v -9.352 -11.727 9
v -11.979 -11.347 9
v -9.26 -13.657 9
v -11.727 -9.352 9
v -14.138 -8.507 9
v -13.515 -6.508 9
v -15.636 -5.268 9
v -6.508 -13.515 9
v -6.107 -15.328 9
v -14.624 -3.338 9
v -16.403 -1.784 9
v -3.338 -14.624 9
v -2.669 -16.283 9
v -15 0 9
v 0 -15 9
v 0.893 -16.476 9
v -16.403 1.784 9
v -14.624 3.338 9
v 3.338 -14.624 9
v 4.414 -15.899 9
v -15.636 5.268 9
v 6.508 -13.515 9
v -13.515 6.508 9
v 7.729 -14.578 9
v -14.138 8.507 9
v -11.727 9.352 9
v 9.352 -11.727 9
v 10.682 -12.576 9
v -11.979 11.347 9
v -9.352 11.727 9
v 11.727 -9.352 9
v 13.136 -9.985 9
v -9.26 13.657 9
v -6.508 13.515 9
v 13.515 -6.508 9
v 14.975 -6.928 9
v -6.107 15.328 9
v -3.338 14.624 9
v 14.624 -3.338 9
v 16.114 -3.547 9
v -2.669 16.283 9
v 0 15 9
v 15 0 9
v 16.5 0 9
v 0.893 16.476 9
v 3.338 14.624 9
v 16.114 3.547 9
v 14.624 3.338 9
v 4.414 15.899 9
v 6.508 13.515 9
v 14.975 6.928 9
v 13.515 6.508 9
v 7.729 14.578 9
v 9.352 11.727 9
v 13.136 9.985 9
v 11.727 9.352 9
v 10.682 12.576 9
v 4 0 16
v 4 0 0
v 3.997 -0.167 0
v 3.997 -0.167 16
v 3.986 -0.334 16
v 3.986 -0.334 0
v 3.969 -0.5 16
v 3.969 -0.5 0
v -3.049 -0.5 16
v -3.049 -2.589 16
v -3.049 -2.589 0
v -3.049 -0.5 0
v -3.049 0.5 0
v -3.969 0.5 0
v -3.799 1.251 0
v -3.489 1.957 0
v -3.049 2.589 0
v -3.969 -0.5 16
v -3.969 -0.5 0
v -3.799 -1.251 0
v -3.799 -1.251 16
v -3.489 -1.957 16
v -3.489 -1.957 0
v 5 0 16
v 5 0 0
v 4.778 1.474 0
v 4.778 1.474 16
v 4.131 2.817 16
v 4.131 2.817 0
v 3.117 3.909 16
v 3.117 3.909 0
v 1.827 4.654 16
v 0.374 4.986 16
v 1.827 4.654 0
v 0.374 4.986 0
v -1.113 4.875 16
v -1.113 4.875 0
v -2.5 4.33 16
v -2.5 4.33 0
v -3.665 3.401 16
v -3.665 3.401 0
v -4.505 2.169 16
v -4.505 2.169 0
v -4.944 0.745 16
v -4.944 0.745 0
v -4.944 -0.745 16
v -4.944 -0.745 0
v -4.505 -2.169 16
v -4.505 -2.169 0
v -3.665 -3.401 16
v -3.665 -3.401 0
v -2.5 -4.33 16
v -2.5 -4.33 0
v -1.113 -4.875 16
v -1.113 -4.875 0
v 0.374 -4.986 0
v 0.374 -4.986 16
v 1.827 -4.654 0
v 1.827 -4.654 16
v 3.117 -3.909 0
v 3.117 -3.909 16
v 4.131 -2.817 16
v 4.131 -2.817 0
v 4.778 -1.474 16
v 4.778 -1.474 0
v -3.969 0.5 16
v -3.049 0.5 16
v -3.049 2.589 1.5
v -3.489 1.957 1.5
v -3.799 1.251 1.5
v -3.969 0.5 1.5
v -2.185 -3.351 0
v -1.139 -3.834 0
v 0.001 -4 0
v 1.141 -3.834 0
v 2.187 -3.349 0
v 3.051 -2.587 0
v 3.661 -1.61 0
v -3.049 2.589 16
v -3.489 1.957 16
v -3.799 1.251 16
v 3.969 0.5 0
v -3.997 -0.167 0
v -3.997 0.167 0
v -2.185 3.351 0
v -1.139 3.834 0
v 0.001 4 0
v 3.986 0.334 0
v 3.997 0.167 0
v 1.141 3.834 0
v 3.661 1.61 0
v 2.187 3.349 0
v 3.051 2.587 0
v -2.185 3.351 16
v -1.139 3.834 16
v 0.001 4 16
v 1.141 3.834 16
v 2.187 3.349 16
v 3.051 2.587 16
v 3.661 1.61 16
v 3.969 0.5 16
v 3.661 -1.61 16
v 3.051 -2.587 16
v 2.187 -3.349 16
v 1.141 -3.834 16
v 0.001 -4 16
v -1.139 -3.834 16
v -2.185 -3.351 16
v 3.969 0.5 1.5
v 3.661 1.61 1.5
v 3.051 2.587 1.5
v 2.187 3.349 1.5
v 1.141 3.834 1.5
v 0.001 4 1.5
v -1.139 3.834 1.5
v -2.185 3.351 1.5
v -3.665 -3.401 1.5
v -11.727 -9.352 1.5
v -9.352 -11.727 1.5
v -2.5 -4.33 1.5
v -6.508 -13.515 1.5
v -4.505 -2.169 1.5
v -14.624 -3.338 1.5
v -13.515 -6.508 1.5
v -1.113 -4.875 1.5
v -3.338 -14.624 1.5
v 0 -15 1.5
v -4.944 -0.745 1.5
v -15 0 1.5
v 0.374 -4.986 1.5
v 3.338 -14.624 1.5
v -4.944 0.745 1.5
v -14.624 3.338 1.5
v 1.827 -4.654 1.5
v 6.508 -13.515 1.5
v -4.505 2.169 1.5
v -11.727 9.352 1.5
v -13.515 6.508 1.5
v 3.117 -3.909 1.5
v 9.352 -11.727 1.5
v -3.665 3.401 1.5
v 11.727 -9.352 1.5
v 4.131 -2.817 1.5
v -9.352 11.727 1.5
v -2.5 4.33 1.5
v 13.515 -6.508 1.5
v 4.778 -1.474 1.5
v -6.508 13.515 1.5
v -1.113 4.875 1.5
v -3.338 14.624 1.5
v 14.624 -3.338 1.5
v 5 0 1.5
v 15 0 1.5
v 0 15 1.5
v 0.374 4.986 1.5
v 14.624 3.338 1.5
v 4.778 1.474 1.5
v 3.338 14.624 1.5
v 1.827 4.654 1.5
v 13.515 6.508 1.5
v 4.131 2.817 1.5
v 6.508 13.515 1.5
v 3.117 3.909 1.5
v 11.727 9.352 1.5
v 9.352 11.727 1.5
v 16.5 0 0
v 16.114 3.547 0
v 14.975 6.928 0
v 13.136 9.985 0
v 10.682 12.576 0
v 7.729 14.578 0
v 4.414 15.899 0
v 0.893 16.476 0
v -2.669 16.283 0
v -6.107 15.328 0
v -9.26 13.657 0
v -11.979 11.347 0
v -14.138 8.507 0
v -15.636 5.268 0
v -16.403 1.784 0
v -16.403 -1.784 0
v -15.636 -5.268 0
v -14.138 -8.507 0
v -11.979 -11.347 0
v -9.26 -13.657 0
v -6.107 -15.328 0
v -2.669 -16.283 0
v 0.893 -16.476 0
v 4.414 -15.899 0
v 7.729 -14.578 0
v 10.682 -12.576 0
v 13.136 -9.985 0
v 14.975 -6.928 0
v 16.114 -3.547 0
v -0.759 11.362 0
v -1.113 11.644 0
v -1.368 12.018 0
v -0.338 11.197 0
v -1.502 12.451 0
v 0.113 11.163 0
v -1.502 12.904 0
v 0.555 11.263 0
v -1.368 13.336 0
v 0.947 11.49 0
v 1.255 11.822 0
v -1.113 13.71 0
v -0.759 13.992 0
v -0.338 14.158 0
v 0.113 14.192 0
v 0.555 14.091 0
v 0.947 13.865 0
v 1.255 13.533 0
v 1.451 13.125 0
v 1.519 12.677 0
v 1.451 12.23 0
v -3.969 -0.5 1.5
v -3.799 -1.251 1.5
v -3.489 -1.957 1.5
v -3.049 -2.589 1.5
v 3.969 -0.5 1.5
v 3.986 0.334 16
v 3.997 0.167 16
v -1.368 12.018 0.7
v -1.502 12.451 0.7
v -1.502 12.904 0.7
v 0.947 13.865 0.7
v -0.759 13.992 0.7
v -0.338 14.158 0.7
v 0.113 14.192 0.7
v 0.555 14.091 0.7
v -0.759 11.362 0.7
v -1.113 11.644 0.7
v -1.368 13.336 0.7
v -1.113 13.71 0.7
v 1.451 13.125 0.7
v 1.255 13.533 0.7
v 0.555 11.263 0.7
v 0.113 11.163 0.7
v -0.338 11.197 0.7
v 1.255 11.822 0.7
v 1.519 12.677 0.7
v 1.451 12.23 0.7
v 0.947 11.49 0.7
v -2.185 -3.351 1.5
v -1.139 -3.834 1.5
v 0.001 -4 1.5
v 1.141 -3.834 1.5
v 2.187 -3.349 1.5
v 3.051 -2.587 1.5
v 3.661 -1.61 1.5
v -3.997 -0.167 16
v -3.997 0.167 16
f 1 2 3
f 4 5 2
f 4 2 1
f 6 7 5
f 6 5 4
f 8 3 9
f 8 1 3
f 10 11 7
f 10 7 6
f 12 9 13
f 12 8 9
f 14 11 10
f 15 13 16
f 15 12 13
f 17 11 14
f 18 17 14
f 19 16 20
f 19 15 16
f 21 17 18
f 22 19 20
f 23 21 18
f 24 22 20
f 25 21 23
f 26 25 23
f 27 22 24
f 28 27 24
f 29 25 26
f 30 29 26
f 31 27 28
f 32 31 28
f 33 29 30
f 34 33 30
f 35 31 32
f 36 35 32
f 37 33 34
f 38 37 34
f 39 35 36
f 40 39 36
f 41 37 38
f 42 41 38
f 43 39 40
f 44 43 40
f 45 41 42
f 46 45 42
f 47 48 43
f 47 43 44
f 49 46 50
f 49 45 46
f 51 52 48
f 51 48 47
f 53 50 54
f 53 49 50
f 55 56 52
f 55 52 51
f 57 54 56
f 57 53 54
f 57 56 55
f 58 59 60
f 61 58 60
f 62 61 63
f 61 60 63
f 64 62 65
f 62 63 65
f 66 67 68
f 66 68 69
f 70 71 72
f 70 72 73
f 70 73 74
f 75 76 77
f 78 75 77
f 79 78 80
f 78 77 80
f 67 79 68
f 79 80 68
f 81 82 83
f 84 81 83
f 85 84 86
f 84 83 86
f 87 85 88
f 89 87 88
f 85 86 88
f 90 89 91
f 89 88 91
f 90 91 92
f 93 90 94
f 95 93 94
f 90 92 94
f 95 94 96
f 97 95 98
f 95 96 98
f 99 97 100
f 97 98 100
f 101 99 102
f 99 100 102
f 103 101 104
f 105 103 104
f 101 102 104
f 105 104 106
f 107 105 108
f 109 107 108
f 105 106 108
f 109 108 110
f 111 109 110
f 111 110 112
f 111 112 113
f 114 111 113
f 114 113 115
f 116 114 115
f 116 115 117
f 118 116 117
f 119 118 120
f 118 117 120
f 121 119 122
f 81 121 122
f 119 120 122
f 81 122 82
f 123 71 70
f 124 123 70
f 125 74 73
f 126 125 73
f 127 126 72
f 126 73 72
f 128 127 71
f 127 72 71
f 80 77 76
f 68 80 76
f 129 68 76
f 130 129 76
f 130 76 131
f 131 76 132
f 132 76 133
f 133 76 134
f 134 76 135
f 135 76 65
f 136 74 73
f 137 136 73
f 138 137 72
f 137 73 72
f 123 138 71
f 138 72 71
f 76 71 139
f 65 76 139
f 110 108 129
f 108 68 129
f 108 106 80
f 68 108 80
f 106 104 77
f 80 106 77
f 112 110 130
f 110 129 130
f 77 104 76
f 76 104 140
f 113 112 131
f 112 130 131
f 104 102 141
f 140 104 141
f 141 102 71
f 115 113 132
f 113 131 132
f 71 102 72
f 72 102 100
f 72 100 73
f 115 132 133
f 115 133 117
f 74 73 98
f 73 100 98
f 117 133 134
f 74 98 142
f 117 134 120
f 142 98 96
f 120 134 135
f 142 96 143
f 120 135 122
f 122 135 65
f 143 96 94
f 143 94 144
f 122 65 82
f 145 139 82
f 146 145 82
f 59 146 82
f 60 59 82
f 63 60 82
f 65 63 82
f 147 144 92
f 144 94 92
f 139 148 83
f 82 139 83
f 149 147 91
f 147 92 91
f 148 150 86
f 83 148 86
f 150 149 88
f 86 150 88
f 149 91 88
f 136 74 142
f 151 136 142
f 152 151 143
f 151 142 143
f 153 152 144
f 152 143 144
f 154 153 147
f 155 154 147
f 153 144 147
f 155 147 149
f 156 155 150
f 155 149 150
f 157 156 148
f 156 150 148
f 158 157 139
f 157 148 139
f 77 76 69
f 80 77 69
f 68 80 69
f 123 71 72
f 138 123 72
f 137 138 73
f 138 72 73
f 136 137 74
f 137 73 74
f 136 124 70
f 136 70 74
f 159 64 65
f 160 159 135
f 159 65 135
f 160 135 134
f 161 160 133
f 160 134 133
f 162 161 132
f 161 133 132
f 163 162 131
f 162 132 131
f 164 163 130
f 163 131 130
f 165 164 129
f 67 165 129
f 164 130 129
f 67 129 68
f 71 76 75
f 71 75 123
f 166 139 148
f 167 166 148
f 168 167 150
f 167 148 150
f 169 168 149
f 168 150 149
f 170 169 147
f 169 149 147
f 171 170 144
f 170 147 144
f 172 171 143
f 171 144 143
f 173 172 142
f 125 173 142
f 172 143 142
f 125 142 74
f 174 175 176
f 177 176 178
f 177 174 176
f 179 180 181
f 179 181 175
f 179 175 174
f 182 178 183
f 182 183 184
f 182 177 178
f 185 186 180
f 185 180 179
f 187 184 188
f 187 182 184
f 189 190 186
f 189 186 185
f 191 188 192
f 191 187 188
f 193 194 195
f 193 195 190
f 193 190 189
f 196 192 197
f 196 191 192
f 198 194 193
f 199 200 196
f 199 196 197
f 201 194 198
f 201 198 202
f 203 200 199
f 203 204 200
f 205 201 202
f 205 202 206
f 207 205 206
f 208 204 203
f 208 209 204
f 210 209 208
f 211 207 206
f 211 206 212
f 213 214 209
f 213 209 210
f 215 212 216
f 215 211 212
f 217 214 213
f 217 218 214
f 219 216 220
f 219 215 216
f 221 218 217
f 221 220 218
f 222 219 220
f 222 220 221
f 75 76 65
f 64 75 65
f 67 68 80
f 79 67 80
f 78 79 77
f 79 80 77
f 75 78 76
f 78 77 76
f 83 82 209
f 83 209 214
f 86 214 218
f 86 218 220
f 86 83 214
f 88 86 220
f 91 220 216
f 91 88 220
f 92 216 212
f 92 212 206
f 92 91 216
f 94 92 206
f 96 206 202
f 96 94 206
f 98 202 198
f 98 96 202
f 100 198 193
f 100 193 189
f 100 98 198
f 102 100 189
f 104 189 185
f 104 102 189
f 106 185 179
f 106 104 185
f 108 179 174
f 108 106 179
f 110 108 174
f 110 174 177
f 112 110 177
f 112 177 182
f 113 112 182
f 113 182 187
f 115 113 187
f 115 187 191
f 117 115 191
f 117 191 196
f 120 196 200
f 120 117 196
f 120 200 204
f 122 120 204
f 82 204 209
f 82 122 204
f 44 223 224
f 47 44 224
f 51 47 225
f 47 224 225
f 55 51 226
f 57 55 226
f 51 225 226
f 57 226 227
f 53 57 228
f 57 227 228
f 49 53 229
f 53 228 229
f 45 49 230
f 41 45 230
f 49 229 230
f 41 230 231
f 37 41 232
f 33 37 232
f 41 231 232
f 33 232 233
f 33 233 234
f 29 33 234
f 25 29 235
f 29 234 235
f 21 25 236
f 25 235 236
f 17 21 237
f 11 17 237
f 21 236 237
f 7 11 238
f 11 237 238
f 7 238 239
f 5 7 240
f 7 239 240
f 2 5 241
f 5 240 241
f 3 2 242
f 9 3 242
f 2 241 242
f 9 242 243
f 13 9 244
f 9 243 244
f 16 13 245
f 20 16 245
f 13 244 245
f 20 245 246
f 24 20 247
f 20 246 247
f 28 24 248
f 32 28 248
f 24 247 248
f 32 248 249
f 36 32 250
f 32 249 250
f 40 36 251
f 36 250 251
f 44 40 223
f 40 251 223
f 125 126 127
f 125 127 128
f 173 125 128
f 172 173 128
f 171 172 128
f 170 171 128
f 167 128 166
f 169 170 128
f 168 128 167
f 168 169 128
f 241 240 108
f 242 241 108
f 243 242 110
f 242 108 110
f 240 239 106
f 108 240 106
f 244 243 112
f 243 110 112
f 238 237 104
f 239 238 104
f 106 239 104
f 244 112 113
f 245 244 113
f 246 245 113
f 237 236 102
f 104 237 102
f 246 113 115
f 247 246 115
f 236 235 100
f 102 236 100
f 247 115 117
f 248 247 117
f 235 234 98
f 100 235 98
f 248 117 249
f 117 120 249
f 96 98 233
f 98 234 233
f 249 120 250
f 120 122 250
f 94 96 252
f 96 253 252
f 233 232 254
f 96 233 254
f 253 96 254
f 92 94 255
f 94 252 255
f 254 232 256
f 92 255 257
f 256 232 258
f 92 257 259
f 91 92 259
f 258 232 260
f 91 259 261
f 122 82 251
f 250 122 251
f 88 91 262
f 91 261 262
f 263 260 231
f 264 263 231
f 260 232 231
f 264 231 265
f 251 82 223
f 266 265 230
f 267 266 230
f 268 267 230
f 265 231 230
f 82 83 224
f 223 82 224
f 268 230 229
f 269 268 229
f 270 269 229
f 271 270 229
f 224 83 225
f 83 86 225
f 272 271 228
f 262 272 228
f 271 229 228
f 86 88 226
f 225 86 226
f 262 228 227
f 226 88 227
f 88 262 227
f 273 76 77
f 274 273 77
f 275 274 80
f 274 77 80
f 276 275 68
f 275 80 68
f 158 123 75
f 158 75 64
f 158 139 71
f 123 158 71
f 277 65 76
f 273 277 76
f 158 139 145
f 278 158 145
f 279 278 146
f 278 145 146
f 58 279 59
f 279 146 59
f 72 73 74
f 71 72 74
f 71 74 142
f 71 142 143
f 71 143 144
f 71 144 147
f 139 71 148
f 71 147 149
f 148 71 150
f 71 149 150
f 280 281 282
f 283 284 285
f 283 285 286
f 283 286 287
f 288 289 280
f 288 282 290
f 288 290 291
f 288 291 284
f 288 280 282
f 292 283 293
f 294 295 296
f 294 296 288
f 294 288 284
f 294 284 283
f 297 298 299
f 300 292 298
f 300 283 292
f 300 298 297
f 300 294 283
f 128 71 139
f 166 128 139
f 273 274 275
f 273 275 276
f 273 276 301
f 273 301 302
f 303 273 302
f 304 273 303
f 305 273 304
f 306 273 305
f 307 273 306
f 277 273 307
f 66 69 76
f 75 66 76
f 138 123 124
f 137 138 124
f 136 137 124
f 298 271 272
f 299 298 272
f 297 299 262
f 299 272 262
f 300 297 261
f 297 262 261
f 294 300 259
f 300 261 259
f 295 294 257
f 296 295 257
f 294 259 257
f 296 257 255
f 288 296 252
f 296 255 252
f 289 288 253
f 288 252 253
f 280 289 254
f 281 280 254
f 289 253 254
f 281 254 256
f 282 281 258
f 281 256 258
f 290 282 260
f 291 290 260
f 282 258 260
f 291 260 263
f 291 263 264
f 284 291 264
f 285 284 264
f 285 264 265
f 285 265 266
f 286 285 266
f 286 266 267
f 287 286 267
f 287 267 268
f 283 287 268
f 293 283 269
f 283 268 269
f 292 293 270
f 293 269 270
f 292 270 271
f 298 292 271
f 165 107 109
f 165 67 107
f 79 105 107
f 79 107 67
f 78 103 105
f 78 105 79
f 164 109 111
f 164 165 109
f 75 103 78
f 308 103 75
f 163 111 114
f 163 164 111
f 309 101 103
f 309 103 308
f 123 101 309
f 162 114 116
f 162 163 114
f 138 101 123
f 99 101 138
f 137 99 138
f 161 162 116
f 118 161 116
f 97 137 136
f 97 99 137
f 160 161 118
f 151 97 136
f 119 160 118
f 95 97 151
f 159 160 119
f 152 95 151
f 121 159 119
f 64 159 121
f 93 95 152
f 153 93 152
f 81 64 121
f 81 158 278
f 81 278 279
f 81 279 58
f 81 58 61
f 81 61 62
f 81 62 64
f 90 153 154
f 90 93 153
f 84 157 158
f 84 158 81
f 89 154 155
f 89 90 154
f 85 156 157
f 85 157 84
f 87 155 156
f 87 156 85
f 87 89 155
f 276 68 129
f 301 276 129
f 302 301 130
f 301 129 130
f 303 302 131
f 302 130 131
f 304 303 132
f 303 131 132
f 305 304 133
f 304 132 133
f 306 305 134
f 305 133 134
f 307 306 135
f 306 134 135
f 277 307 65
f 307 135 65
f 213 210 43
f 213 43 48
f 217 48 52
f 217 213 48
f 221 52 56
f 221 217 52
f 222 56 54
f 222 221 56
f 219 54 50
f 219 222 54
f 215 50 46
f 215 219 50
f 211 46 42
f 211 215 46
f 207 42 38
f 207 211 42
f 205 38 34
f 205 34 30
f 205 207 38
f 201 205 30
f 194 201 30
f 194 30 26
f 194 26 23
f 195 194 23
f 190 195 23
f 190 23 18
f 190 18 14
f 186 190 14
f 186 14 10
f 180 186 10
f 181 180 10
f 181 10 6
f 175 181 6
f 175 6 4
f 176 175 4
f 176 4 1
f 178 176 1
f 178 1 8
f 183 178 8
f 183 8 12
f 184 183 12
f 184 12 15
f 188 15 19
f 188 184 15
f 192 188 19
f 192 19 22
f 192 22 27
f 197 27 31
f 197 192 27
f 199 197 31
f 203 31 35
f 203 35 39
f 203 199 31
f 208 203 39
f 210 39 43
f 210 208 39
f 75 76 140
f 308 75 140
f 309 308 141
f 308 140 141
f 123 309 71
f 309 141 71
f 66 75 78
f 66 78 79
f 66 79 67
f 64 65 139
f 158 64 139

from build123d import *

# Parameters (mm, degrees)
F0_R     = 15
F0_R_2   = 5
F1_DEPTH = 1.5
F0_R_3   = 16.5
F2_DEPTH = 9
F3_DEPTH = 16
F0_W     = 0.9195400787
F0_H     = 1
F0_W_2   = 7.0177138545
F4_DEPTH = 16
F5_R     = 1.518718607
F6_DEPTH = 0.7


with BuildPart() as f1:
    # F0 (on Top) → F1 (new body)
    with BuildSketch(Plane.XY):
        Circle(F0_R)
        Circle(F0_R_2, mode=Mode.SUBTRACT)
    extrude(amount=F1_DEPTH)

    # F0 (on Top) → F2 (join)
    with BuildSketch(Plane.XY):
        Circle(F0_R_3)
        Circle(F0_R, mode=Mode.SUBTRACT)
    extrude(amount=F2_DEPTH)

    # F5 (on face) → F6 (cut)
    with BuildSketch(Plane(origin=(0, 0, 0), x_dir=(1, 0, 0), z_dir=(0, 0, -1))):
        with Locations((0, -12.6772308722)):
            Circle(F5_R)
    extrude(amount=-F6_DEPTH, mode=Mode.SUBTRACT)


with BuildPart() as f1b:
    # F0 (on Top) → F1, piece 2 (new body)
    with BuildSketch(Plane.XY):
        with BuildLine():
            Line((-3.0490868879, 0.5), (-3.0490868879, 2.5890286113))
            ThreePointArc((-3.0490868879, 2.5890286113), (-3.661022681, 1.6114940054), (-3.9686269666, 0.5))
            Line((-3.9686269666, 0.5), (-3.0490868879, 0.5))
        make_face()
        with BuildLine():
            Line((-3.0490868879, 0.5), (3.9686269666, 0.5))
            ThreePointArc((3.9686269666, 0.5), (1.1412268065, 3.8337450849), (-3.0490868879, 2.5890286113))
            Line((-3.0490868879, 2.5890286113), (-3.0490868879, 0.5))
        make_face()
    extrude(amount=F1_DEPTH)


with BuildPart() as f1c:
    # F0 (on Top) → F1, piece 3 (new body)
    with BuildSketch(Plane.XY):
        with BuildLine():
            ThreePointArc((-3.9686269666, -0.5), (-3.661022681, -1.6114940054), (-3.0490868879, -2.5890286113))
            Line((-3.0490868879, -2.5890286113), (-3.0490868879, -0.5))
            Line((-3.0490868879, -0.5), (-3.9686269666, -0.5))
        make_face()
        with BuildLine():
            ThreePointArc((-3.0490868879, -2.5890286113), (1.1412268065, -3.8337450849), (3.9686269666, -0.5))
            Line((3.9686269666, -0.5), (-3.0490868879, -0.5))
            Line((-3.0490868879, -0.5), (-3.0490868879, -2.5890286113))
        make_face()
    extrude(amount=F1_DEPTH)


with BuildPart() as f3:
    # F0 (on Top) → F3 (new body)
    with BuildSketch(Plane.XY):
        Circle(F0_R_2)
        with BuildLine():
            ThreePointArc((3.9686269666, 0.5), (3.9921490369, 0.2504916502), (4, 0))
            ThreePointArc((4, 0), (3.9921490369, -0.2504916502), (3.9686269666, -0.5))
            ThreePointArc((3.9686269666, -0.5), (1.1412268065, -3.8337450849), (-3.0490868879, -2.5890286113))
            ThreePointArc((-3.0490868879, -2.5890286113), (-3.661022681, -1.6114940054), (-3.9686269666, -0.5))
            ThreePointArc((-3.9686269666, -0.5), (-4, 0), (-3.9686269666, 0.5))
            ThreePointArc((-3.9686269666, 0.5), (-3.661022681, 1.6114940054), (-3.0490868879, 2.5890286113))
            ThreePointArc((-3.0490868879, 2.5890286113), (1.1412268065, 3.8337450849), (3.9686269666, 0.5))
        make_face(mode=Mode.SUBTRACT)
    extrude(amount=F3_DEPTH)


with BuildPart() as f3b:
    # F0 (on Top) → F3, piece 2 (new body)
    with BuildSketch(Plane.XY):
        with Locations((-3.5088569272, 0)):
            Rectangle(F0_W, F0_H)
        with Locations((0.4597700394, 0)):
            Rectangle(F0_W_2, F0_H)
    extrude(amount=F3_DEPTH)


with BuildPart() as f4:
    # F0 (on Top) → F4 (new body)
    with BuildSketch(Plane.XY):
        with BuildLine():
            Line((-3.0490868879, 0.5), (-3.0490868879, 2.5890286113))
            ThreePointArc((-3.0490868879, 2.5890286113), (-3.661022681, 1.6114940054), (-3.9686269666, 0.5))
            Line((-3.9686269666, 0.5), (-3.0490868879, 0.5))
        make_face()
    extrude(amount=F4_DEPTH)


with BuildPart() as f4b:
    # F0 (on Top) → F4, piece 2 (new body)
    with BuildSketch(Plane.XY):
        with BuildLine():
            ThreePointArc((-3.9686269666, -0.5), (-3.661022681, -1.6114940054), (-3.0490868879, -2.5890286113))
            Line((-3.0490868879, -2.5890286113), (-3.0490868879, -0.5))
            Line((-3.0490868879, -0.5), (-3.9686269666, -0.5))
        make_face()
    extrude(amount=F4_DEPTH)


solid = Compound([f1.part, f1b.part, f1c.part, f3.part, f3b.part, f4.part, f4b.part])
